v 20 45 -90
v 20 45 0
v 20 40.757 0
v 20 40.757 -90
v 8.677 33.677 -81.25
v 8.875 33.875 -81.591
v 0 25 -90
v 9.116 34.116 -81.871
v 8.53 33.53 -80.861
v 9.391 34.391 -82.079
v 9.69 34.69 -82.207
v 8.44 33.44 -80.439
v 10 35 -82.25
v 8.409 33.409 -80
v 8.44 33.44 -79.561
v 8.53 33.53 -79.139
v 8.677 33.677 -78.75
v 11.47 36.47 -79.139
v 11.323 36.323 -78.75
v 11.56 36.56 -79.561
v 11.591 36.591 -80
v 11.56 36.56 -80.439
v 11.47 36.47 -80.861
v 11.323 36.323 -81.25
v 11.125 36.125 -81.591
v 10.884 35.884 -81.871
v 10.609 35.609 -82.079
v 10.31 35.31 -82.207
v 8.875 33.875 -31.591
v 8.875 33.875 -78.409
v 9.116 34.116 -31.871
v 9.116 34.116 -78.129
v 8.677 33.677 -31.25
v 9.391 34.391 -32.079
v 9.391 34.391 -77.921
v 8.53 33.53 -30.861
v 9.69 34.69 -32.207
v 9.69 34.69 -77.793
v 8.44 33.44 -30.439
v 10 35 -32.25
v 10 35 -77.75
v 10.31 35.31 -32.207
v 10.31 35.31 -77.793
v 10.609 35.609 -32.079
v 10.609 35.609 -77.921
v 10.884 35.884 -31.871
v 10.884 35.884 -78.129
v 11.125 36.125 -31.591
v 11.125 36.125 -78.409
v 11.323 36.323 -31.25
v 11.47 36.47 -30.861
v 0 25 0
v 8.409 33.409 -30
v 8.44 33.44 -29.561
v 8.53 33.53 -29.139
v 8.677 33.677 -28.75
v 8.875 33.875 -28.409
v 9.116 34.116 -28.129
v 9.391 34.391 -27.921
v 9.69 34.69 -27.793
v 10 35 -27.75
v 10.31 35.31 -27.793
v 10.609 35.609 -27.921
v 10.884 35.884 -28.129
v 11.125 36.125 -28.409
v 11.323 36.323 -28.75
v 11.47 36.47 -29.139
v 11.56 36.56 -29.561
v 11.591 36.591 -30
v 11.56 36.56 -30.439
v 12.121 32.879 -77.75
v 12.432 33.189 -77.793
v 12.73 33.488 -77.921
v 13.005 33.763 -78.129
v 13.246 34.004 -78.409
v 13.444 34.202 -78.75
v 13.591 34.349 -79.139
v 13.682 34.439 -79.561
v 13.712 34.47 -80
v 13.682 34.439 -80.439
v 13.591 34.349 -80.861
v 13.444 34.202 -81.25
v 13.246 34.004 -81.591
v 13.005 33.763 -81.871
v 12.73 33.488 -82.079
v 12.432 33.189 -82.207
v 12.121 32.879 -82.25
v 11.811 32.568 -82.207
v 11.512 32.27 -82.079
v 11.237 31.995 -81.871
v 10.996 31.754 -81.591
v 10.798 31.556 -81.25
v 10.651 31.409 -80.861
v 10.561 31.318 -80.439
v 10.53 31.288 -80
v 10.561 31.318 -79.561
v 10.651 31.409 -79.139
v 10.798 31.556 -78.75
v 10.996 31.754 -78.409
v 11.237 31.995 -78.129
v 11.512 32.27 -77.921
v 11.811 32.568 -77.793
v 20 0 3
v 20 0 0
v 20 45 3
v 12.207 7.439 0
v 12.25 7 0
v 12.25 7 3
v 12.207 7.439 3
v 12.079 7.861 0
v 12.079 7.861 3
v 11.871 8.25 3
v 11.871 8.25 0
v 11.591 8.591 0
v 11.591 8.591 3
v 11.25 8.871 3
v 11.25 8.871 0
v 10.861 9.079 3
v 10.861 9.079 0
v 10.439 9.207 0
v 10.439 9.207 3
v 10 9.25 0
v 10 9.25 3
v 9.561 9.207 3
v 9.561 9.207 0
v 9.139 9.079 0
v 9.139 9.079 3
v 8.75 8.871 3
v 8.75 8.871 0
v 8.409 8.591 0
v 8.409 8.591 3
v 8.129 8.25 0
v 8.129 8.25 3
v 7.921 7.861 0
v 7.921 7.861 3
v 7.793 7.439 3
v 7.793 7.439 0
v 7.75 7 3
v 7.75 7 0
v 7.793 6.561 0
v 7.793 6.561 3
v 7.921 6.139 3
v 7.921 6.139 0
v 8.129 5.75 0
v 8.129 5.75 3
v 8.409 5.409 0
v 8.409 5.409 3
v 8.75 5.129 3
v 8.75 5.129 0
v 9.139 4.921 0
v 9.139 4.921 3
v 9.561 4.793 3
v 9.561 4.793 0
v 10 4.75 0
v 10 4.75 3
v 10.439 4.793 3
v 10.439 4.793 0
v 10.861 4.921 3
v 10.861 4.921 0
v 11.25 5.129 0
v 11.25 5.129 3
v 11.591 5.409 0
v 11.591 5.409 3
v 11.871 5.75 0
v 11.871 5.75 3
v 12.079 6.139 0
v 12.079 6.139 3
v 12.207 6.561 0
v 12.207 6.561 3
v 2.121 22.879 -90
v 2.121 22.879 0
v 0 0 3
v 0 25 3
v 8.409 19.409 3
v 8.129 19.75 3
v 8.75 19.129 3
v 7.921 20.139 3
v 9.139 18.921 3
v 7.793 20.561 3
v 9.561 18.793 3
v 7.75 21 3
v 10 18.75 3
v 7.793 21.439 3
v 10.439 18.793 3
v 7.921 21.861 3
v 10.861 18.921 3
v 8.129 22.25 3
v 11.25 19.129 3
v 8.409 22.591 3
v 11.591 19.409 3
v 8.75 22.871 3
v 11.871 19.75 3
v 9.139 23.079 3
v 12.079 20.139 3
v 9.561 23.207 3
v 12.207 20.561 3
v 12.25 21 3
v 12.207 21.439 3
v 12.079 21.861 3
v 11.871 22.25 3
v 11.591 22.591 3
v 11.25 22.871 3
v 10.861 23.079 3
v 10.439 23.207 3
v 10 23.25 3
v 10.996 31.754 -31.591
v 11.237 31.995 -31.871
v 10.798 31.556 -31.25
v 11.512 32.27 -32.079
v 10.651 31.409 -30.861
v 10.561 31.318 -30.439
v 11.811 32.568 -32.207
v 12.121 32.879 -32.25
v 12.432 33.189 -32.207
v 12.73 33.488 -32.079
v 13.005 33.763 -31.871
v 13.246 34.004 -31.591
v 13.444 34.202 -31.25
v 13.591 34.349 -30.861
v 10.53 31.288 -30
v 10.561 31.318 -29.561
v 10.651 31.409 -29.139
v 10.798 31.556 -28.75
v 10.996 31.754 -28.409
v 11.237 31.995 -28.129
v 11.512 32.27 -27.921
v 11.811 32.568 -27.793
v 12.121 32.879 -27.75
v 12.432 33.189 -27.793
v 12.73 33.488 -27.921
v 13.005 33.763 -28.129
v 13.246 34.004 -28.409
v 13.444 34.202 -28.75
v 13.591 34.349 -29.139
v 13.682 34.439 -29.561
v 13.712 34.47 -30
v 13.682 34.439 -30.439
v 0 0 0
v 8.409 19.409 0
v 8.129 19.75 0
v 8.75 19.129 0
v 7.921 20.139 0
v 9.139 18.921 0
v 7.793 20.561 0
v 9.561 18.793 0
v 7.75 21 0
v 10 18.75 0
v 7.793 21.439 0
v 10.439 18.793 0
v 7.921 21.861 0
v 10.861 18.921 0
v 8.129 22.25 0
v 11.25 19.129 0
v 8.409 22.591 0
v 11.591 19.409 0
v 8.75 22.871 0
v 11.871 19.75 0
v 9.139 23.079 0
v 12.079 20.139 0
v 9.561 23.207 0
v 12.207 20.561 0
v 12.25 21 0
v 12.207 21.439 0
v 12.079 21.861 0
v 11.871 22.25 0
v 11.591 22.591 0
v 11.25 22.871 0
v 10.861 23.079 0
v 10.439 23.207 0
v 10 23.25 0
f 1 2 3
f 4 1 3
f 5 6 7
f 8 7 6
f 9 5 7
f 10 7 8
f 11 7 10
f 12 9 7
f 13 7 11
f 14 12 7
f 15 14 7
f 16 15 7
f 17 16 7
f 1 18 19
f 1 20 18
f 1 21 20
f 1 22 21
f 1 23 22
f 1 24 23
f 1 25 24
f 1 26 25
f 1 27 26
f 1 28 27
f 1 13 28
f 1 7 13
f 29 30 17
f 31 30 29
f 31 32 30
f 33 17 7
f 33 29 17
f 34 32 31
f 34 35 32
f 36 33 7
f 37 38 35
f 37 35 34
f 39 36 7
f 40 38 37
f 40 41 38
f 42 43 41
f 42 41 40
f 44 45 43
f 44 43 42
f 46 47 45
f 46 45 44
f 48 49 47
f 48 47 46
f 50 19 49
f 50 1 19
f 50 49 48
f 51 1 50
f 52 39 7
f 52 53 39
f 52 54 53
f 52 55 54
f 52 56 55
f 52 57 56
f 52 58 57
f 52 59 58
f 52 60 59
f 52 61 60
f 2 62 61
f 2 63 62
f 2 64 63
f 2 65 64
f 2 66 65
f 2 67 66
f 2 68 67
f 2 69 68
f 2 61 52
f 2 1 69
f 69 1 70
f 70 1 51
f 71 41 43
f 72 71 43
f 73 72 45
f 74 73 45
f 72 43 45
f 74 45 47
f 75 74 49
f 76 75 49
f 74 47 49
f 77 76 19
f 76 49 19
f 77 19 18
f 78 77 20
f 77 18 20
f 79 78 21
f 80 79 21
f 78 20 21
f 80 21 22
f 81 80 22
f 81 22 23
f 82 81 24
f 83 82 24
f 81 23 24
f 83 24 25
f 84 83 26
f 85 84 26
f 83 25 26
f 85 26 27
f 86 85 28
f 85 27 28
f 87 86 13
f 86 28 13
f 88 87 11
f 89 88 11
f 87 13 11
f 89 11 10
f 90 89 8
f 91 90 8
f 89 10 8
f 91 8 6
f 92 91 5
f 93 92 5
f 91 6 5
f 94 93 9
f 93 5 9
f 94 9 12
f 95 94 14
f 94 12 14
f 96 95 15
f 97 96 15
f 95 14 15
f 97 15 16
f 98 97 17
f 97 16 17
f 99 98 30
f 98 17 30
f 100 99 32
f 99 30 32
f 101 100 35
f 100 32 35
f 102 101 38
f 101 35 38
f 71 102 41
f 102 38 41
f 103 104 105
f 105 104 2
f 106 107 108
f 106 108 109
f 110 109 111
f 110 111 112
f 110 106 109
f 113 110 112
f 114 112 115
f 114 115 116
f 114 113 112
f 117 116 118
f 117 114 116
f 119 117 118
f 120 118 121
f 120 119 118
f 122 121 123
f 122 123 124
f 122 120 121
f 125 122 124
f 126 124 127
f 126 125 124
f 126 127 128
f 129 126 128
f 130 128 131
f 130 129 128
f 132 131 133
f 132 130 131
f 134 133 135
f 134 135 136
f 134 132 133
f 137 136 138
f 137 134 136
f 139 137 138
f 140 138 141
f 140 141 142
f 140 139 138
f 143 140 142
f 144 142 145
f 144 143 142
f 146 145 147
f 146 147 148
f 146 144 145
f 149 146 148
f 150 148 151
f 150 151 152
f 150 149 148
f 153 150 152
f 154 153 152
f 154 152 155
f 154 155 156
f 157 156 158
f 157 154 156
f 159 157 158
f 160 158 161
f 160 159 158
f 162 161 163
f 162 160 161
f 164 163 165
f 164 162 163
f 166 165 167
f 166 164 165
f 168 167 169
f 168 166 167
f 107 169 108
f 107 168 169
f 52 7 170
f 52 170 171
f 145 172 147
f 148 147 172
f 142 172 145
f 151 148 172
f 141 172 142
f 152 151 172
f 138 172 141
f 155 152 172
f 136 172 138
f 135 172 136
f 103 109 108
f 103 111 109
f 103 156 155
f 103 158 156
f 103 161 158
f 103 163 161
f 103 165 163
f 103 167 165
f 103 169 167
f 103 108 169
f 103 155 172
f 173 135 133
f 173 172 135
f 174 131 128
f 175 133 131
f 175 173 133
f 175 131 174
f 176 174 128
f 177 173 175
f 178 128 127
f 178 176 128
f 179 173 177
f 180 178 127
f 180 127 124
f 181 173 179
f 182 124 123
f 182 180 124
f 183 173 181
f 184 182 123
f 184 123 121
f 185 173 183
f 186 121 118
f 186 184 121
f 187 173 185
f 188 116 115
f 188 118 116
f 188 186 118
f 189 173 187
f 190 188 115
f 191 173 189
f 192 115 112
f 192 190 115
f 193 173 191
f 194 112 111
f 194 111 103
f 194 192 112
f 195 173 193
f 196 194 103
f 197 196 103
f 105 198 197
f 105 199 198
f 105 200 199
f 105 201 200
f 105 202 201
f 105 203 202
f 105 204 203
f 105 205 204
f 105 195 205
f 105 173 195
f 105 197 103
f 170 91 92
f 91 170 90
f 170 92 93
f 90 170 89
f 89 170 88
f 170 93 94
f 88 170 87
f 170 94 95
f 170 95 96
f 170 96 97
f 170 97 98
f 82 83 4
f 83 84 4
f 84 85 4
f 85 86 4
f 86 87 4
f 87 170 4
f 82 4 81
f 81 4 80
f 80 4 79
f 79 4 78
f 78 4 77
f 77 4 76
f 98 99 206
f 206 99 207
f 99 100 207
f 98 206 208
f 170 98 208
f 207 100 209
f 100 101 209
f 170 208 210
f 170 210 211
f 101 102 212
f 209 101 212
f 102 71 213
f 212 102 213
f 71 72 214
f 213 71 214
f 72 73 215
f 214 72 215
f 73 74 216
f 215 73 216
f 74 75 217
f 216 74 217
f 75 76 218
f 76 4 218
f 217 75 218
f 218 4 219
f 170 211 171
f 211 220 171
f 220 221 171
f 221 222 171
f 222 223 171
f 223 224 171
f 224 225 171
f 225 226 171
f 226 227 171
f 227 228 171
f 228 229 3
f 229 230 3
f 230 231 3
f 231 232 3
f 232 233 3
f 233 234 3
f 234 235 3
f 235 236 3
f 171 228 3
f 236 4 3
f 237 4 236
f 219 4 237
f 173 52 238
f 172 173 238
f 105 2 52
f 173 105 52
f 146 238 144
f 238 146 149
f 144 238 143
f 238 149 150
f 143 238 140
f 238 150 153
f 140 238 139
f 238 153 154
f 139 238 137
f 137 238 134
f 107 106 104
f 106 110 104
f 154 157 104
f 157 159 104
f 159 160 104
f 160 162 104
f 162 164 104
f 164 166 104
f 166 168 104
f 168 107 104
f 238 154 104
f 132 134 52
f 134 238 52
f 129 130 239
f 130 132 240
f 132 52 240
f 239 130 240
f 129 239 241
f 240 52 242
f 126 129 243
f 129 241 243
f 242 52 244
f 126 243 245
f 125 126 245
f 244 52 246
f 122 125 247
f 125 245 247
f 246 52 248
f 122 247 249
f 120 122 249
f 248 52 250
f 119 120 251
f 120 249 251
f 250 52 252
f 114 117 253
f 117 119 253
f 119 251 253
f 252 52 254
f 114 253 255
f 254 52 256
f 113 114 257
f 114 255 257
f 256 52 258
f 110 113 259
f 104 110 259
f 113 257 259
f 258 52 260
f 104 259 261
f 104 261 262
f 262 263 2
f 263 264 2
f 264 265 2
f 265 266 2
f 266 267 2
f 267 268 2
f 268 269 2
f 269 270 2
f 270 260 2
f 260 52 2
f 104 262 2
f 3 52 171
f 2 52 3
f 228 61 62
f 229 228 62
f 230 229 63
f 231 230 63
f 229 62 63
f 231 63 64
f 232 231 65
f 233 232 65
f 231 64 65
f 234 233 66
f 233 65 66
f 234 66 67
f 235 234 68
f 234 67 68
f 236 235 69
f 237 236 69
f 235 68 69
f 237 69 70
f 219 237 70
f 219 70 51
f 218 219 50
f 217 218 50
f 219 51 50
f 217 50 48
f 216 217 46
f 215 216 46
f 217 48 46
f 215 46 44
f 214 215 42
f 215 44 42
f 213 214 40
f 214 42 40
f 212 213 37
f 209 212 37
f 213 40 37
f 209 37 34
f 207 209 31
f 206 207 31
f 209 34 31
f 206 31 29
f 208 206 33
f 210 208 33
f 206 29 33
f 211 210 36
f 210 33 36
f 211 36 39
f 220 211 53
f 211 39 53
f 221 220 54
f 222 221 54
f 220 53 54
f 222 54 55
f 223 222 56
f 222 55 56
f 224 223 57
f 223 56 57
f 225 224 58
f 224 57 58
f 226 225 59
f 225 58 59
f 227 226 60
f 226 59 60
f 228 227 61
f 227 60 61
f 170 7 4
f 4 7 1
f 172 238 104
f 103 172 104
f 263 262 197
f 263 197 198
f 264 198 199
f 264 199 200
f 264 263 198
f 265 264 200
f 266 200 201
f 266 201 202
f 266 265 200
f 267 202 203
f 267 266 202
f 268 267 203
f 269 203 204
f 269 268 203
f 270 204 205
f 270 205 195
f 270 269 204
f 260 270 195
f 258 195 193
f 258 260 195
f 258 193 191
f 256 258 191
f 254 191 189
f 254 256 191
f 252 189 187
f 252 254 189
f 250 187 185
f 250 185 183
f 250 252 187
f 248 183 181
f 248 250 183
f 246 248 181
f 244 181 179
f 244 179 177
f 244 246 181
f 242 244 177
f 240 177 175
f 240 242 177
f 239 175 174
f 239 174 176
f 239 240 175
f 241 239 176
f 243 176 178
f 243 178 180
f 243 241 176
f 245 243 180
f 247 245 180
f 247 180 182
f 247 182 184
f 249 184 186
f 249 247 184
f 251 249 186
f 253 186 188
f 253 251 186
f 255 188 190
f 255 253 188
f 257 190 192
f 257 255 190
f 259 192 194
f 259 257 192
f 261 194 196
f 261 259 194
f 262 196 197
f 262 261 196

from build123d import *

# Parameters (mm, degrees)
SKETCH1_R           = 2.25
BOSS_EXTRUDE1_DEPTH = 3
SKETCH2_W           = 90
SKETCH2_H           = 28.284271247
SKETCH2_R           = 2.25
BOSS_EXTRUDE2_DEPTH = 3
CUT_EXTRUDE1_DEPTH  = 91


with BuildPart() as part:
    # Sketch1 → Boss-Extrude1 (new body)
    with BuildSketch(Plane.XY):
        Polygon((0, 0), (20, 0), (20, 25), (20, 45), (0, 25), align=None)
        with Locations((10, 7)):
            Circle(SKETCH1_R, mode=Mode.SUBTRACT)
        with Locations((10, 21)):
            Circle(SKETCH1_R, mode=Mode.SUBTRACT)
    extrude(amount=BOSS_EXTRUDE1_DEPTH)


with BuildPart() as body_2:
    # Sketch2 → Boss-Extrude2 (new body)
    with BuildSketch(Plane(origin=(-12.5, 12.5, 0), x_dir=(0, 0, 1), z_dir=(-0.707106781, 0.707106781, 0))):
        with Locations((-45, 31.819805154)):
            Rectangle(SKETCH2_W, SKETCH2_H)
        with Locations((-80, 31.819805153)):
            Circle(SKETCH2_R, mode=Mode.SUBTRACT)
        with Locations((-30, 31.819805153)):
            Circle(SKETCH2_R, mode=Mode.SUBTRACT)
    extrude(amount=-BOSS_EXTRUDE2_DEPTH)

    # Sketch3 → Cut-Extrude1 (cut, through all)
    with BuildSketch(Plane.XY):
        Polygon((22.121320344, 42.878679656), (20, 45), (20, 40.757359313), align=None)
    extrude(amount=-CUT_EXTRUDE1_DEPTH, mode=Mode.SUBTRACT)


solid = Compound([part.part, body_2.part])
